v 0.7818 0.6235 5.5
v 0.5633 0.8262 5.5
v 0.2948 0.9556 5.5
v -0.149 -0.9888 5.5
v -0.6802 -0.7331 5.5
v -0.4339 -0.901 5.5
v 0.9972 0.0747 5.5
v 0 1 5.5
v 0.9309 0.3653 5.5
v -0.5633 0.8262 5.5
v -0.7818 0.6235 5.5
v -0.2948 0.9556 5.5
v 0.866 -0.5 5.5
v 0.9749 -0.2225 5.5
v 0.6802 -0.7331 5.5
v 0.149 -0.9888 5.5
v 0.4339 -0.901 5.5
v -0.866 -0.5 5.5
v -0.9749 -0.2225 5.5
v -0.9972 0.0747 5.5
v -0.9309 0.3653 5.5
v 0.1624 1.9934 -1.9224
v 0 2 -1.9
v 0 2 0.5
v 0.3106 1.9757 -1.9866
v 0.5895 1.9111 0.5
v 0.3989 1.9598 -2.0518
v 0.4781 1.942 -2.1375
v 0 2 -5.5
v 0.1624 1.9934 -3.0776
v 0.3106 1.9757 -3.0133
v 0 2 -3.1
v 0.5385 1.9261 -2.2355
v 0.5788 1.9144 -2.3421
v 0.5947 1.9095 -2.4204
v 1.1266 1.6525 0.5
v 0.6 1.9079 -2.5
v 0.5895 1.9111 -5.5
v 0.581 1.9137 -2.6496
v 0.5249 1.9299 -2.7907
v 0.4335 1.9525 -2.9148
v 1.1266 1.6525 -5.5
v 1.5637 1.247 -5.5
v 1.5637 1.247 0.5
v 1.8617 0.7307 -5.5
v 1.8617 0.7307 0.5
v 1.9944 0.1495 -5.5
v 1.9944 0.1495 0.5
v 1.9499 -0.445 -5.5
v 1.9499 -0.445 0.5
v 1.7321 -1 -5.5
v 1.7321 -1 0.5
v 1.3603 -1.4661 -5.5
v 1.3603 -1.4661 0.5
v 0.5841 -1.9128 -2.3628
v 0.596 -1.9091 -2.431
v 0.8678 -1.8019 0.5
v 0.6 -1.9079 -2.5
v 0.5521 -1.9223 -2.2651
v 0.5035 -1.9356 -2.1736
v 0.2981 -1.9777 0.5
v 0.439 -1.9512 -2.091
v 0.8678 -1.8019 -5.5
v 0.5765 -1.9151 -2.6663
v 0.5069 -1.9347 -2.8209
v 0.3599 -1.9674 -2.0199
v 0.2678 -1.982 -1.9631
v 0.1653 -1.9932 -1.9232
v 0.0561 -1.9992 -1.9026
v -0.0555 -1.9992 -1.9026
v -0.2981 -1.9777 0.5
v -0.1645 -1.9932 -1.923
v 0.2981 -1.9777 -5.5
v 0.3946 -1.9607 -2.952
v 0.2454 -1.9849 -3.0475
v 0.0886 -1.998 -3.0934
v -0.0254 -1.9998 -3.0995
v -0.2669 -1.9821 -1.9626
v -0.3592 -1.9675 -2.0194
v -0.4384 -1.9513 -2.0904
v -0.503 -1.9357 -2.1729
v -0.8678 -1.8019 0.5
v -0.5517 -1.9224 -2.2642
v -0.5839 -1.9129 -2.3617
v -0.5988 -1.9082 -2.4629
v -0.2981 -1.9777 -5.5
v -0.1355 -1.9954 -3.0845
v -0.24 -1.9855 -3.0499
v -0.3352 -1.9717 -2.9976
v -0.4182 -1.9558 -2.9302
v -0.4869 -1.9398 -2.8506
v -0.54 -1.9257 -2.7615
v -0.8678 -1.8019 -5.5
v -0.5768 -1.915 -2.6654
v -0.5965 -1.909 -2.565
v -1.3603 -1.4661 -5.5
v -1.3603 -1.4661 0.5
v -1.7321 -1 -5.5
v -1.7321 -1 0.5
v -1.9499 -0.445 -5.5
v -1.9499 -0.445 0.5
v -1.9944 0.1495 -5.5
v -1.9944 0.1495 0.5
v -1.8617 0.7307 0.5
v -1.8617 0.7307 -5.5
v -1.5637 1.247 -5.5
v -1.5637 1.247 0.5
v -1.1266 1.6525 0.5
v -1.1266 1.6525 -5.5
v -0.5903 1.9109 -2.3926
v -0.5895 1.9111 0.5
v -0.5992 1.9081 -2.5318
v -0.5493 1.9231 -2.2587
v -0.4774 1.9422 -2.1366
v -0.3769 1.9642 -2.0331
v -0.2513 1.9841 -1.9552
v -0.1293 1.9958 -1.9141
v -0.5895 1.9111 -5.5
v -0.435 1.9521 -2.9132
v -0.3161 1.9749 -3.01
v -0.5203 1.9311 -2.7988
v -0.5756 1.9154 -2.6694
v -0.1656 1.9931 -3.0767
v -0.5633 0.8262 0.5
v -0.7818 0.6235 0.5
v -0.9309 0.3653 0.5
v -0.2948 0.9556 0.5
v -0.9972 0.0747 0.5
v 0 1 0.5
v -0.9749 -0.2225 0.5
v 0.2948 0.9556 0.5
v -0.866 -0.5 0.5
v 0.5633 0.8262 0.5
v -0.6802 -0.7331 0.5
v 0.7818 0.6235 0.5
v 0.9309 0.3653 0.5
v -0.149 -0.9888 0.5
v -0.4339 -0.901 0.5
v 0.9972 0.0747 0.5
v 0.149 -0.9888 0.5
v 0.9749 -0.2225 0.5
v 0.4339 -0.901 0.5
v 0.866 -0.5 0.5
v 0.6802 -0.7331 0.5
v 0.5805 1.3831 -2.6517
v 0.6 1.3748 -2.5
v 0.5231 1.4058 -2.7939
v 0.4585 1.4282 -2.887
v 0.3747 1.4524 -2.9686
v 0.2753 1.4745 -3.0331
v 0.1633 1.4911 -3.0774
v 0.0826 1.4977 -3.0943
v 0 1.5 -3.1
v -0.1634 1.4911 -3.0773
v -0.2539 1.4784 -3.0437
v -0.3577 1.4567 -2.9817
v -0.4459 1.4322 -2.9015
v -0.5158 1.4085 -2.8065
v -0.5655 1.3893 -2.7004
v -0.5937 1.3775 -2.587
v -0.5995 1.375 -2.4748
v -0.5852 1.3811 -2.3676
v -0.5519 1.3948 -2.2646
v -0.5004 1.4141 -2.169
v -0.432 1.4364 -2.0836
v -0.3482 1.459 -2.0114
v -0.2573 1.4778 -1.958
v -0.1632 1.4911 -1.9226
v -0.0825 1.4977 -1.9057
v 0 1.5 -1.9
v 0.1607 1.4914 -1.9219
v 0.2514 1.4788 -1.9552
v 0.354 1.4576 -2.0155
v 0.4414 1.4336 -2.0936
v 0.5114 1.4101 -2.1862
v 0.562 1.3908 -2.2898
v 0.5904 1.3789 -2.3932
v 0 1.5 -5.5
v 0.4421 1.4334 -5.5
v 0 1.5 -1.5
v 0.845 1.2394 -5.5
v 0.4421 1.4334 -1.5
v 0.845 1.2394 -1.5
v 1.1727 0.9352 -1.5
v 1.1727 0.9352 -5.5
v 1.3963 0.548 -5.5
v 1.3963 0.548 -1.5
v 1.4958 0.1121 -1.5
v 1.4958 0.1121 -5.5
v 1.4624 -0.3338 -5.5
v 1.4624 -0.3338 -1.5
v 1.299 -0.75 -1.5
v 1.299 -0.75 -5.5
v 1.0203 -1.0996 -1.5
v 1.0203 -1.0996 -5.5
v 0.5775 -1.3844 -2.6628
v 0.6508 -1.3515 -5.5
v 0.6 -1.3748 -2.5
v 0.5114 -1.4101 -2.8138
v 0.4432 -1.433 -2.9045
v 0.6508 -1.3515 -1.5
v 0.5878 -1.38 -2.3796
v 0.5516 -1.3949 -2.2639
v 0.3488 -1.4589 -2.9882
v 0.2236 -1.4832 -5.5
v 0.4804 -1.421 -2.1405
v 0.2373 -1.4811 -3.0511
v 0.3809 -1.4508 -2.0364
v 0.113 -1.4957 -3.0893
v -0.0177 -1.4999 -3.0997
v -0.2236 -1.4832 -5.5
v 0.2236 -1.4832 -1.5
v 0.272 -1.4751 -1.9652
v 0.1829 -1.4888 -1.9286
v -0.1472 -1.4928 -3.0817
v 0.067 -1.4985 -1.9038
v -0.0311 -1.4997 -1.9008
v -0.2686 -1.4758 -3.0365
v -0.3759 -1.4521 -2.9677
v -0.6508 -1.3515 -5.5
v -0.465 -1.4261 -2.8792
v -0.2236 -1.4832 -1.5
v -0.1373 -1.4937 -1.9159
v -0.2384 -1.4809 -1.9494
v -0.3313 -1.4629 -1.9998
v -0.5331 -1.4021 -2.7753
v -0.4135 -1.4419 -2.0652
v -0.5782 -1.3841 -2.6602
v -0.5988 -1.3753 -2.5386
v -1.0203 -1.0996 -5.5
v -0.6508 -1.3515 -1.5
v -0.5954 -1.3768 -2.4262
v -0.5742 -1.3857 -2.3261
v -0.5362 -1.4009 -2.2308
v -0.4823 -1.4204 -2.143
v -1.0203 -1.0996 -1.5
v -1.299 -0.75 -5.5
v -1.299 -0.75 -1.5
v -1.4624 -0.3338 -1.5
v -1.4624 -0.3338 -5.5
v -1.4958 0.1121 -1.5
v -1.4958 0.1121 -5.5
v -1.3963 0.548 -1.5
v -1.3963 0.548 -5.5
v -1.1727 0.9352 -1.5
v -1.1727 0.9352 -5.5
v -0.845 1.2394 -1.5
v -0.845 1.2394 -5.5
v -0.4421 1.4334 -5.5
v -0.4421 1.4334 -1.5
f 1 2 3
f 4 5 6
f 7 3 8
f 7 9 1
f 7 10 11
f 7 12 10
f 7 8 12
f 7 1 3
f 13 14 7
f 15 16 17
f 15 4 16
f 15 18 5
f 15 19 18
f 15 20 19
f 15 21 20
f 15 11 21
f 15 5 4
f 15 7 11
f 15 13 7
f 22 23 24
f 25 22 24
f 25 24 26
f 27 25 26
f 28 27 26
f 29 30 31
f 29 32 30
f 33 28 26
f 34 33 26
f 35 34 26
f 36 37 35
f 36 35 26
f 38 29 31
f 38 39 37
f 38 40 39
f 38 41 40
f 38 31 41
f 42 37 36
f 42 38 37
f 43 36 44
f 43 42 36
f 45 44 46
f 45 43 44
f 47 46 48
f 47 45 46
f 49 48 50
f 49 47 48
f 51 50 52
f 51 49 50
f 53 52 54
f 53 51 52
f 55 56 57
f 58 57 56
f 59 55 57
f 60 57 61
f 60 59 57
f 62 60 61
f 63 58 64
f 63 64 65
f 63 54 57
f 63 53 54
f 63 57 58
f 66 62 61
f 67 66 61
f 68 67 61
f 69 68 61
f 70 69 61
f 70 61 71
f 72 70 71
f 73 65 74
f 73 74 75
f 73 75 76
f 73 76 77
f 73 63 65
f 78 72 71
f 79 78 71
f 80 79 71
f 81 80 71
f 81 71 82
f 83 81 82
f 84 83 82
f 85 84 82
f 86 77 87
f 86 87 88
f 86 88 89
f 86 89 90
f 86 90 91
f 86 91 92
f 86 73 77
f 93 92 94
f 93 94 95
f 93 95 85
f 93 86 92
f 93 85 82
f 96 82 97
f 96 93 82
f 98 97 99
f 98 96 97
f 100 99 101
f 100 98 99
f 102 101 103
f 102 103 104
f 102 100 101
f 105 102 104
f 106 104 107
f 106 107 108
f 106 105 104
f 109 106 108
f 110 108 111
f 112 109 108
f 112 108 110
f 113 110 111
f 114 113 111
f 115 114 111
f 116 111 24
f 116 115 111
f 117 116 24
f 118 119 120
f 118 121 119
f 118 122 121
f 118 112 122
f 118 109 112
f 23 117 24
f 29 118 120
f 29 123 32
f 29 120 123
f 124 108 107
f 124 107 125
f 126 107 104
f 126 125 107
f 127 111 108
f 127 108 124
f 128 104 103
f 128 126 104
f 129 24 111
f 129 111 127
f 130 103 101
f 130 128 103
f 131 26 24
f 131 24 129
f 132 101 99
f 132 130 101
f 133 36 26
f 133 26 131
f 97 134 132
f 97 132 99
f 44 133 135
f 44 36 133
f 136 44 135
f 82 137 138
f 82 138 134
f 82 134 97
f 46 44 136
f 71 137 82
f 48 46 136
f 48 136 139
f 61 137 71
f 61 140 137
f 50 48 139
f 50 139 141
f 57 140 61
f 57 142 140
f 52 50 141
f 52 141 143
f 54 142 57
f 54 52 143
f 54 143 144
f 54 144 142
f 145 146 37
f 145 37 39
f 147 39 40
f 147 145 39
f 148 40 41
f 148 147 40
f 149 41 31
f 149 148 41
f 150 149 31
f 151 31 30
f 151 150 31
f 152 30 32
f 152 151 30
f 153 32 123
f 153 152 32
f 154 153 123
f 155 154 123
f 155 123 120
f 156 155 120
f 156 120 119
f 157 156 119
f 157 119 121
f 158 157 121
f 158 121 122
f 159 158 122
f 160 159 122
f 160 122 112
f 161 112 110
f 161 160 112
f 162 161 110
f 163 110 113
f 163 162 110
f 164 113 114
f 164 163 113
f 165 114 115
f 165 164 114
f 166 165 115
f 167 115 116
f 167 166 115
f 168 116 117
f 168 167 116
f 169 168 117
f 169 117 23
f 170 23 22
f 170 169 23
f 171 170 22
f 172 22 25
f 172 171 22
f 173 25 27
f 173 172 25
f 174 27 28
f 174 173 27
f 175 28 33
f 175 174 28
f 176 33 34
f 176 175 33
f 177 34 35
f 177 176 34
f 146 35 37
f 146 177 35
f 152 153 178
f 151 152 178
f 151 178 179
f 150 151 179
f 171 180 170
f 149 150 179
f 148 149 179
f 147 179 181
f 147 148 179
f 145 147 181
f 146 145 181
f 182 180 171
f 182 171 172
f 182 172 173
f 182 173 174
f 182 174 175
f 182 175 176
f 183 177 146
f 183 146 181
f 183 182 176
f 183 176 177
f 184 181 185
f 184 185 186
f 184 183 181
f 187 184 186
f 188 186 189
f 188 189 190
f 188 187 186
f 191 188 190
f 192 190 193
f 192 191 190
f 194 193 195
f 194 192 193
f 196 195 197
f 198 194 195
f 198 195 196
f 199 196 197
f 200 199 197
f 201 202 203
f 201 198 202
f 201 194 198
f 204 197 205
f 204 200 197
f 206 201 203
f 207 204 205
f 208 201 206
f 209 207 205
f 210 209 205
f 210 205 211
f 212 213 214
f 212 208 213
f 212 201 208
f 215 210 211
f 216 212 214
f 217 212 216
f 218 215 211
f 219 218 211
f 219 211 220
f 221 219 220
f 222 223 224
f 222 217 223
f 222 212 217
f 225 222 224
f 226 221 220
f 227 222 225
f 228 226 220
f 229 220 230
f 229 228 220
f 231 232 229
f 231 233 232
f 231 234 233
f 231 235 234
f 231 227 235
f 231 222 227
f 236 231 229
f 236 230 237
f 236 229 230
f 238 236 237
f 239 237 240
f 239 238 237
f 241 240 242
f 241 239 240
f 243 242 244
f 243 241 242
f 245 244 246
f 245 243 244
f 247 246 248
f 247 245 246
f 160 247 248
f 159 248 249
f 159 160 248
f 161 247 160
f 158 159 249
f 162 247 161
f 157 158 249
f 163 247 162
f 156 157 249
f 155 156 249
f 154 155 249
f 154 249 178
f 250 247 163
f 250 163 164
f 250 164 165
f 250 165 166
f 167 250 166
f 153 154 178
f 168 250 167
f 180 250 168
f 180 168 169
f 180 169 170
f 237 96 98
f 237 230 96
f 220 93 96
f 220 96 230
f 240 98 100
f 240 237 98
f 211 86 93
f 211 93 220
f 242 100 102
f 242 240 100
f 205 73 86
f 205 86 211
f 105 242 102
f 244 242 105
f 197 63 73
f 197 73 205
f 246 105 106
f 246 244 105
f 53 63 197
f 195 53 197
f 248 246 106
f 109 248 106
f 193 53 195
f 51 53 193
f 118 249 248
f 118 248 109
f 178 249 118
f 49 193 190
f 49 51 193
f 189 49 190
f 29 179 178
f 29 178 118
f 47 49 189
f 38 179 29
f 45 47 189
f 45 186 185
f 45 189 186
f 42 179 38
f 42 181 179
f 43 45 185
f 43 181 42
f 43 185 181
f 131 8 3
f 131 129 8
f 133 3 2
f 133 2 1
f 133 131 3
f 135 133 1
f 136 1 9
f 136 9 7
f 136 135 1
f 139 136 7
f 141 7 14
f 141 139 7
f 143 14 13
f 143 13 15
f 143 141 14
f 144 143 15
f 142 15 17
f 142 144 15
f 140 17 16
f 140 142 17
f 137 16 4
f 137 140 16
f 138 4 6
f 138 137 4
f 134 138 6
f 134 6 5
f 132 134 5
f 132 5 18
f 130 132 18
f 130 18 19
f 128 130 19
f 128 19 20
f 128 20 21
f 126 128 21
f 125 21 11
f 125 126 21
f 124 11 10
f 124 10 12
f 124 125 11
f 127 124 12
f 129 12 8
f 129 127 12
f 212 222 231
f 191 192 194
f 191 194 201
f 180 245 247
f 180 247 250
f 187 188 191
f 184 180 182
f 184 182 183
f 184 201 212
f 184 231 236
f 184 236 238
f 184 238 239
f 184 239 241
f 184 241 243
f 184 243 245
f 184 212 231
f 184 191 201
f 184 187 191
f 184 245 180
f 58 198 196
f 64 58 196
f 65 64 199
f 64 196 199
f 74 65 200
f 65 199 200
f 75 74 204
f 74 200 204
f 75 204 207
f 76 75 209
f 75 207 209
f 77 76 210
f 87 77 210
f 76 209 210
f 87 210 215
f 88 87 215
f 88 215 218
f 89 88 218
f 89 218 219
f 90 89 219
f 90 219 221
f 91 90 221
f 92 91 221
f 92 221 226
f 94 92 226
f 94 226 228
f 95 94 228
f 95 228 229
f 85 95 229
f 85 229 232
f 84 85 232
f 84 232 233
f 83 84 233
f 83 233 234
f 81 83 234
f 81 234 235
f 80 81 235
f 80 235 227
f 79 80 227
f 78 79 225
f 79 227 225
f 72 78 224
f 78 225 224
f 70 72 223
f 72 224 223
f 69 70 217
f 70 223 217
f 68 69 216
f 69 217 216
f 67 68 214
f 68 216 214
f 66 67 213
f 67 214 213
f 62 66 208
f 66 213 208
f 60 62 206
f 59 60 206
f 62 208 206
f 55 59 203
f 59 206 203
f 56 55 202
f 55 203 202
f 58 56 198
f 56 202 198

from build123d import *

# Parameters (mm, degrees)
ESQUISSE2_R                  = 0.6
ENL_V_MAT_EXTRU_1_DEPTH      = 3
ENL_V_MAT_EXTRU_1_DEPTH_BACK = 3


with BuildPart() as part:
    # Esquisse1 → Révolution1 (revolve)
    with BuildSketch(Plane(origin=(0, 0, 0), x_dir=(0, 0, -1), z_dir=(1, 0, 0))):
        Polygon((-5.5, 0), (-5.5, 1), (-0.5, 1), (-0.5, 2), (5.5, 2), (5.5, 1.5), (1.5, 1.5), (1.5, 0), align=None)
    revolve(axis=Axis((0, 0, 5.5), (0, 0, -1)))

    # Esquisse2 → Enlèv. mat.-Extru.1 (cut, two sides)
    with BuildSketch(Plane(origin=(0, 0, 0), x_dir=(1, 0, 0), z_dir=(0, 1, 0))) as enl_v_mat_extru_1_sk:
        with Locations((0, 2.5)):
            Circle(ESQUISSE2_R)
    extrude(amount=ENL_V_MAT_EXTRU_1_DEPTH, mode=Mode.SUBTRACT)
    extrude(enl_v_mat_extru_1_sk.sketch, amount=-ENL_V_MAT_EXTRU_1_DEPTH_BACK, mode=Mode.SUBTRACT)


solid = part.part
